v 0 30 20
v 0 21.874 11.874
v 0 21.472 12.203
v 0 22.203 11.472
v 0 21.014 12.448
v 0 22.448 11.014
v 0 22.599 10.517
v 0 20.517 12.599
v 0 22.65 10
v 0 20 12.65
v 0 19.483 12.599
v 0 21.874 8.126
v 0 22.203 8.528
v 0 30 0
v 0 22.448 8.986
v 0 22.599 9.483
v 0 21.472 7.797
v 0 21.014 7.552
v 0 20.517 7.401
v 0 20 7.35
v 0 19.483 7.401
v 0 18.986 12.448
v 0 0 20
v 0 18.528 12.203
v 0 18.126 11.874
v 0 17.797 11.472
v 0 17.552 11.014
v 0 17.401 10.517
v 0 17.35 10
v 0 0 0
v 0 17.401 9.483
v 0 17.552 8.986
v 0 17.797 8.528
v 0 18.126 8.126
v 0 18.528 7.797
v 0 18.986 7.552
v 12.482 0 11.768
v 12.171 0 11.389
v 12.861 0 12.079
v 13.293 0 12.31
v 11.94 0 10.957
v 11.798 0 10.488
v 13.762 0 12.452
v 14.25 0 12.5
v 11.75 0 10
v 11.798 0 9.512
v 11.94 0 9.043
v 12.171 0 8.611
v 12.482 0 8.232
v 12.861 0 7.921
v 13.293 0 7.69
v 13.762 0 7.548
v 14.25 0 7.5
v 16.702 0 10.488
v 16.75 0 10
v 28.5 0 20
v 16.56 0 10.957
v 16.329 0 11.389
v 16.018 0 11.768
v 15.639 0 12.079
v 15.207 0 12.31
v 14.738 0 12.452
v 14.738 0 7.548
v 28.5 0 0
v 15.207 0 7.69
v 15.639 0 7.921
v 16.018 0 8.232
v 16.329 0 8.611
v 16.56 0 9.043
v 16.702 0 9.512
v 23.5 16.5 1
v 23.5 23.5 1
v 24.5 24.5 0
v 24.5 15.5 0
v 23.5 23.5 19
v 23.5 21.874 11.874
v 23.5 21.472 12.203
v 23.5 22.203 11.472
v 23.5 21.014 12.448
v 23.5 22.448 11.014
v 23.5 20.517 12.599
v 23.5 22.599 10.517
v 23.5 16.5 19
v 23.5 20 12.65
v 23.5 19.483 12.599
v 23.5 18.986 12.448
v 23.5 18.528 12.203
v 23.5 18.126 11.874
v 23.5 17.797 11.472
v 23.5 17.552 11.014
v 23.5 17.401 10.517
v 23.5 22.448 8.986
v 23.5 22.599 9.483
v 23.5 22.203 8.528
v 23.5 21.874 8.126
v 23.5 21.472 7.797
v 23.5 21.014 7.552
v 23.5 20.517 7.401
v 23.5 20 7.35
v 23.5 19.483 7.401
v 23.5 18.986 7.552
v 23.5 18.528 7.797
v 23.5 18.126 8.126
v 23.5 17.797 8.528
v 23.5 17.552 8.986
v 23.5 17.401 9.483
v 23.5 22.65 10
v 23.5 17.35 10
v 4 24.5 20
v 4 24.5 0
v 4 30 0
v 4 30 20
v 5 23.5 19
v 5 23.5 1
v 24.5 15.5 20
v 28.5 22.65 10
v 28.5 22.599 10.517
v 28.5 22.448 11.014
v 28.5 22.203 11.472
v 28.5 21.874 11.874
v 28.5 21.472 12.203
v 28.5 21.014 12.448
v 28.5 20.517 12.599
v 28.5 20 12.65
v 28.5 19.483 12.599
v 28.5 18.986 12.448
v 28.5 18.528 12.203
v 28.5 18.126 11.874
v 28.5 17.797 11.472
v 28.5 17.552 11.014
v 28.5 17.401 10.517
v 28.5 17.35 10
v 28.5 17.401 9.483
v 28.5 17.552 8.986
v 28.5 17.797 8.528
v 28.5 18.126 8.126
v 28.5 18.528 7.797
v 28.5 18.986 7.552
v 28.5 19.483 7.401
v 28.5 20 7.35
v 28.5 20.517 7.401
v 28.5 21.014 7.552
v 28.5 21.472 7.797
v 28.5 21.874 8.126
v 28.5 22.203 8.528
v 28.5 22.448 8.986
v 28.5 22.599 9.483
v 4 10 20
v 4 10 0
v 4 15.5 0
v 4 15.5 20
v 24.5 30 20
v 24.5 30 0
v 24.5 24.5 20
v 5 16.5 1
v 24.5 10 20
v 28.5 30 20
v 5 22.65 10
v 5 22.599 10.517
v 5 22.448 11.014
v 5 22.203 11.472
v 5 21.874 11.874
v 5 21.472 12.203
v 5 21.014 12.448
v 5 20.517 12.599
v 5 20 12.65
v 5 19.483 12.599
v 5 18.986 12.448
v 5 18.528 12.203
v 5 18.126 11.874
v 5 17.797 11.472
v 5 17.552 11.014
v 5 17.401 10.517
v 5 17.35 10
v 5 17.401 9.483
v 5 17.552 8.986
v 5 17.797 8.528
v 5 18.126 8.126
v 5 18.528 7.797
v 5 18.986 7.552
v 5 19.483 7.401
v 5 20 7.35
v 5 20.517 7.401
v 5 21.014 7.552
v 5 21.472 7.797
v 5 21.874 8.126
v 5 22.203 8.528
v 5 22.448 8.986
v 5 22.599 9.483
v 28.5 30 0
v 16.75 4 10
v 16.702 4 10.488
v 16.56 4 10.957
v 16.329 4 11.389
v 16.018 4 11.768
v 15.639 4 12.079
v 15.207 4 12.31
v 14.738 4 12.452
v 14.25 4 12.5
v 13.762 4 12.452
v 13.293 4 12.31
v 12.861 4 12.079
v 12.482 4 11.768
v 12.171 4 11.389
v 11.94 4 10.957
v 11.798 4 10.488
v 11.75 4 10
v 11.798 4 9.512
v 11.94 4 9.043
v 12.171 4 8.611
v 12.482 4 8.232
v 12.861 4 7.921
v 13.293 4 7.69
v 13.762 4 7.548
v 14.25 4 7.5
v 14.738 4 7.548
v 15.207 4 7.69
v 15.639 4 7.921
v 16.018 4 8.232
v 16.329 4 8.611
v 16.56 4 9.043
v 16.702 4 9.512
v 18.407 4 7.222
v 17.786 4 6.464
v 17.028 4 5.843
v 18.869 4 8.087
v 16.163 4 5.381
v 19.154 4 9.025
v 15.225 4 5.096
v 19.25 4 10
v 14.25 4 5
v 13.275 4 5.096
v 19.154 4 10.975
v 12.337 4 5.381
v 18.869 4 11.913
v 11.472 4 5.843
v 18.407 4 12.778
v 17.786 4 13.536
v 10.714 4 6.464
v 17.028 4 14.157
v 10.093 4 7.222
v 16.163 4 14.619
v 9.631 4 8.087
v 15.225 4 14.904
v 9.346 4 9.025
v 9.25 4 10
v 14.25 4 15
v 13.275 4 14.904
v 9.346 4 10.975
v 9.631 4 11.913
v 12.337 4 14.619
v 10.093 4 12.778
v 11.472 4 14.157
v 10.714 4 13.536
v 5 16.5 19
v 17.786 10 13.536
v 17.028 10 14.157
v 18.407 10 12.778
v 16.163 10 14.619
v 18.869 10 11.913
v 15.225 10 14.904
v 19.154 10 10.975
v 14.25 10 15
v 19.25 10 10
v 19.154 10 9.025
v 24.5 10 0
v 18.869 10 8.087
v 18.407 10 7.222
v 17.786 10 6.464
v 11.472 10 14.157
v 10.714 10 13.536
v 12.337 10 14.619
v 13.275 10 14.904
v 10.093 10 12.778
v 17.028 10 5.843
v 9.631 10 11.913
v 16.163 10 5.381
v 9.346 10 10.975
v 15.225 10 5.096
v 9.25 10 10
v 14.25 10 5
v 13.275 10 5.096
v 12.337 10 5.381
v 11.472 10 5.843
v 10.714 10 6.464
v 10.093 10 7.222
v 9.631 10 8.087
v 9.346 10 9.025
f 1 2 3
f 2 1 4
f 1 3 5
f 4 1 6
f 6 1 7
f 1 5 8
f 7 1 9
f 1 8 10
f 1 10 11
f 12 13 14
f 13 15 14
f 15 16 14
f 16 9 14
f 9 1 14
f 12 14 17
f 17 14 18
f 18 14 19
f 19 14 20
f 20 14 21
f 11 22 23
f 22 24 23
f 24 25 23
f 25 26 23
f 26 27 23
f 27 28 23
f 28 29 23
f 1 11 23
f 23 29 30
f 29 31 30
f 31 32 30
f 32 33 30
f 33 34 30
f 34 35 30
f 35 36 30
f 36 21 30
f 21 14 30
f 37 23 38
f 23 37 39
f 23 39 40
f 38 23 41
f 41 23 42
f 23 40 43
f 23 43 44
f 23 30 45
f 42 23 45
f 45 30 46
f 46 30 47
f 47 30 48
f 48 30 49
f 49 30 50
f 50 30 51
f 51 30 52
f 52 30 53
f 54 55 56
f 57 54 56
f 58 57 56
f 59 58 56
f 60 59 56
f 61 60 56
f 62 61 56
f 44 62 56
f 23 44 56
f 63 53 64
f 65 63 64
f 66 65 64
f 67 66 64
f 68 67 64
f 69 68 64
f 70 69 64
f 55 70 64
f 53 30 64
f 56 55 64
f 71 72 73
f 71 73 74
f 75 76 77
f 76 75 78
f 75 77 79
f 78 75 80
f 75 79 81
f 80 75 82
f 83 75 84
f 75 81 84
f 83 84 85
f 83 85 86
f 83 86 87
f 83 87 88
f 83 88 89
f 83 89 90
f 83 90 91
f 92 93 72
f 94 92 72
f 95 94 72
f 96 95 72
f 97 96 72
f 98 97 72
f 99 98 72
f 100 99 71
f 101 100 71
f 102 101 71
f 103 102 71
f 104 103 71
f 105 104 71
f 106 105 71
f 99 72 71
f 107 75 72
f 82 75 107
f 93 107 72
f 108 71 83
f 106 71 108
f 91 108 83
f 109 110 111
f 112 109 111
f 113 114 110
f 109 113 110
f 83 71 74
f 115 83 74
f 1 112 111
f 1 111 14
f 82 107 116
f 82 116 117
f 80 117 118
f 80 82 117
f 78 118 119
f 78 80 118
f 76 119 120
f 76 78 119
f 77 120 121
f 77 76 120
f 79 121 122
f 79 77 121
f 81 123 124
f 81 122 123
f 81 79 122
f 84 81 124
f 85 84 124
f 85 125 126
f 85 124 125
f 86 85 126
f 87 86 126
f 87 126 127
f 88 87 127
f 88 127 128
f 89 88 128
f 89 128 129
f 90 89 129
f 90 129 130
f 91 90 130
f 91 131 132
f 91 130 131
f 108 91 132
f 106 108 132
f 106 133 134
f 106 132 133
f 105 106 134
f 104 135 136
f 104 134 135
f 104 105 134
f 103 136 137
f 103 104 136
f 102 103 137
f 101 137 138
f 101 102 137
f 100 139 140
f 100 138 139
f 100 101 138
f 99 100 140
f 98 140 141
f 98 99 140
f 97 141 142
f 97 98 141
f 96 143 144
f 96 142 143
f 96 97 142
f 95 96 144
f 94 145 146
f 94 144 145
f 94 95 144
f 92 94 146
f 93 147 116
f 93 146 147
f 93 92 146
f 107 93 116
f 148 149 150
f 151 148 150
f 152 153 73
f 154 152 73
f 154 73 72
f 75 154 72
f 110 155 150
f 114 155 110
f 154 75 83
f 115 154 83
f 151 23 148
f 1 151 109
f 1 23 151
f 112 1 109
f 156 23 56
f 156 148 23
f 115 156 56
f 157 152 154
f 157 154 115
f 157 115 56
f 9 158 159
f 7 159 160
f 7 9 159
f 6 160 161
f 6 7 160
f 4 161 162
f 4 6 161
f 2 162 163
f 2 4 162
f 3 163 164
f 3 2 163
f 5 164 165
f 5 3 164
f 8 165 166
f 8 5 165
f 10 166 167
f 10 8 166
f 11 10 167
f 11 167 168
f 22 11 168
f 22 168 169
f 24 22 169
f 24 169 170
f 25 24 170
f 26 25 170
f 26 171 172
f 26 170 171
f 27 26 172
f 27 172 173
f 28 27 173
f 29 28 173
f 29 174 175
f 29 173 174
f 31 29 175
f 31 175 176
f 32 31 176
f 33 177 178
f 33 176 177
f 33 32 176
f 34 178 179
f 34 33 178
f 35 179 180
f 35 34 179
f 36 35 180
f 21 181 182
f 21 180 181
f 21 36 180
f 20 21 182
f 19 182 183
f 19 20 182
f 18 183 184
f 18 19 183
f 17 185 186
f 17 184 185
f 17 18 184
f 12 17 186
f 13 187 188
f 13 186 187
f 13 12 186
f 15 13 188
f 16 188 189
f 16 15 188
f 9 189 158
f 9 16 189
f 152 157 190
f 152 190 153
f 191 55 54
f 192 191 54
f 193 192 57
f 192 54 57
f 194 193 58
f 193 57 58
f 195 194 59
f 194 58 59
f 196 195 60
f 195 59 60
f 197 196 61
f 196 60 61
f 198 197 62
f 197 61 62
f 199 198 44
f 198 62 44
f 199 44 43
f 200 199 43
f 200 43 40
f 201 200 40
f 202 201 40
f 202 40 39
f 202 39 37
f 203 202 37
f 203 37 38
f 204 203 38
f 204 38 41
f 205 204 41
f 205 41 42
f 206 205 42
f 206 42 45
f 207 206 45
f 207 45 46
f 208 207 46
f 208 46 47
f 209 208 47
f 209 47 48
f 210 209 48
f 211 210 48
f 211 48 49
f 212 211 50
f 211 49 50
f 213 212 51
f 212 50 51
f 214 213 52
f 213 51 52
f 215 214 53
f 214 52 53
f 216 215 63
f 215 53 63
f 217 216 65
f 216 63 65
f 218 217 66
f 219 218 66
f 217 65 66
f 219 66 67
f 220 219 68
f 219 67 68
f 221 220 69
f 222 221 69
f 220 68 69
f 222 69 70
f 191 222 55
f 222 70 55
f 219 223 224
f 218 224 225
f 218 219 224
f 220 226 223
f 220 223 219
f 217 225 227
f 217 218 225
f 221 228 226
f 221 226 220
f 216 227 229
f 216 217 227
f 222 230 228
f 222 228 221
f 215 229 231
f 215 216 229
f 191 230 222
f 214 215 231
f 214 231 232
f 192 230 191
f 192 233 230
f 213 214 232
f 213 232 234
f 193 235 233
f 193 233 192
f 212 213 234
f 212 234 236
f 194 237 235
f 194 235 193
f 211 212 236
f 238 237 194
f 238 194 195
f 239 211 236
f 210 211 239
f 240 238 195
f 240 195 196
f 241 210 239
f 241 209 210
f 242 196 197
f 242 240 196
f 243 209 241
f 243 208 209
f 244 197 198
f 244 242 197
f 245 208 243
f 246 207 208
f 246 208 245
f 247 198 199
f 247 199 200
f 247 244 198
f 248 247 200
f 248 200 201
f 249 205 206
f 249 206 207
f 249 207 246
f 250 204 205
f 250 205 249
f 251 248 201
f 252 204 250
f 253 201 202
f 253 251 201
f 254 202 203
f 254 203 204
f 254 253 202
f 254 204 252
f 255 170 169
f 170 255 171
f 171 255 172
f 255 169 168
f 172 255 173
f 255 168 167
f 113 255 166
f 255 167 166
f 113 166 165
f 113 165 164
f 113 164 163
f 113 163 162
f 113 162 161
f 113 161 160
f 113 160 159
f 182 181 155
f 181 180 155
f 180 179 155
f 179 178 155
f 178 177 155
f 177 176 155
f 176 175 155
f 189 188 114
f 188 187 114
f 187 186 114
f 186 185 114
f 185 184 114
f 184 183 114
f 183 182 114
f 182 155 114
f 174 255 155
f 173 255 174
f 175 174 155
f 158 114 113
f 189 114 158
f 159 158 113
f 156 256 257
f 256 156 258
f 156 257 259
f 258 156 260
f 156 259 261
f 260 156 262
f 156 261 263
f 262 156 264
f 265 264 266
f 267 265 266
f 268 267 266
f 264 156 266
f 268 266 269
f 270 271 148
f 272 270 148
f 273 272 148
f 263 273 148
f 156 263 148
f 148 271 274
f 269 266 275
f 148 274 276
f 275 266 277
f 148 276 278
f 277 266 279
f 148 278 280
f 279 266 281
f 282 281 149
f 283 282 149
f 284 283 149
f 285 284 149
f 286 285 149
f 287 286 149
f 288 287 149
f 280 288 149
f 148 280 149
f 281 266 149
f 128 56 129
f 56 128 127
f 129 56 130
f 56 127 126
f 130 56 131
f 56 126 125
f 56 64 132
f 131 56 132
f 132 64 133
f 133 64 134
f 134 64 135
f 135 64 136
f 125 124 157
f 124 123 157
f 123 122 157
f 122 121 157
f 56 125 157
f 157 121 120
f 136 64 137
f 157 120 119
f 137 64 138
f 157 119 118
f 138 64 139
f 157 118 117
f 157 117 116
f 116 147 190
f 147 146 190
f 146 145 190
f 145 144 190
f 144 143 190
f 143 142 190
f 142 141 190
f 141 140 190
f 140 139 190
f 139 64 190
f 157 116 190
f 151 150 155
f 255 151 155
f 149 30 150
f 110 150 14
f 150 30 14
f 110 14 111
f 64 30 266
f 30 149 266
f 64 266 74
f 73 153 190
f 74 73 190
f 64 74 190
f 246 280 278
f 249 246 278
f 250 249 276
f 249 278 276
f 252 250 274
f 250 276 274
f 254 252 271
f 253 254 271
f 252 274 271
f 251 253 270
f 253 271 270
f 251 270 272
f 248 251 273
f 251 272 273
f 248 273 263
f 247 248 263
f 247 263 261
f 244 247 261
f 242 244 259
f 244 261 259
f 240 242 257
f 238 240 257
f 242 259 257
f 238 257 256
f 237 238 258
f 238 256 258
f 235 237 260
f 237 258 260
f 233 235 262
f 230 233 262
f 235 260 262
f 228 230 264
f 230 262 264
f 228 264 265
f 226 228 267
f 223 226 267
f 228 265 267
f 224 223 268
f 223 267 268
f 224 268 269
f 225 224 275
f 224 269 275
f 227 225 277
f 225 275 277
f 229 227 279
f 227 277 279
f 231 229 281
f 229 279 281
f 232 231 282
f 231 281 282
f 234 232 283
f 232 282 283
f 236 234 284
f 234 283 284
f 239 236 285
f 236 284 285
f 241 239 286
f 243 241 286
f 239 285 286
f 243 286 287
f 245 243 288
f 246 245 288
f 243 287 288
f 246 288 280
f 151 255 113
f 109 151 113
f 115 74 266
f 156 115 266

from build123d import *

# Parameters (mm, degrees)
F1_DEPTH  = 20
F2_R      = 2.5
F3_DEPTH  = 30.001
F4_R      = 5
F5_DEPTH  = 6
F7_DEPTH  = 20
F8_SIZE   = 1
F9_R      = 2.65
F10_DEPTH = 28.501


with BuildPart() as f1:
    # F0 (on Top) → F1 (new body)
    with BuildSketch(Plane.XY):
        Polygon((0, 30), (0, 0), (28.5, 0), (28.5, 30), (24.5, 30), (24.5, 10), (4, 10), (4, 30), align=None)
    extrude(amount=F1_DEPTH)

    # F2 (on Front) → F3 (cut, through all)
    with BuildSketch(Plane.XZ):
        with Locations((14.25, 10)):
            Circle(F2_R)
    extrude(amount=-F3_DEPTH, mode=Mode.SUBTRACT)

    # F4 (on face) → F5 (cut)
    with BuildSketch(Plane(origin=(0, 10, 0), x_dir=(-1, 0, 0), z_dir=(0, 1, 0))):
        with Locations((-14.25, 10)):
            Circle(F4_R)
    extrude(amount=-F5_DEPTH, mode=Mode.SUBTRACT)

    # F6 (on Top) → F7 (join, through all)
    with BuildSketch(Plane.XY):
        Polygon((4, 24.5), (4, 15.5), (5, 16.5), (5, 23.5), align=None)
        Polygon((23.5, 16.5), (24.5, 15.5), (24.5, 24.5), (23.5, 23.5), align=None)
    extrude(amount=F7_DEPTH)

    # F8
    f8_edges = [f1.edges().sort_by_distance(p)[0] for p in [
        (5, 20, 20),
        (5, 20, 0),
        (23.5, 20, 20),
        (23.5, 20, 0),
    ]]
    chamfer(f8_edges, length=F8_SIZE)

    # F9 (on Right) → F10 (cut, through all)
    with BuildSketch(Plane.YZ):
        with Locations((20, 10)):
            Circle(F9_R)
    extrude(amount=F10_DEPTH, mode=Mode.SUBTRACT)


solid = f1.part
